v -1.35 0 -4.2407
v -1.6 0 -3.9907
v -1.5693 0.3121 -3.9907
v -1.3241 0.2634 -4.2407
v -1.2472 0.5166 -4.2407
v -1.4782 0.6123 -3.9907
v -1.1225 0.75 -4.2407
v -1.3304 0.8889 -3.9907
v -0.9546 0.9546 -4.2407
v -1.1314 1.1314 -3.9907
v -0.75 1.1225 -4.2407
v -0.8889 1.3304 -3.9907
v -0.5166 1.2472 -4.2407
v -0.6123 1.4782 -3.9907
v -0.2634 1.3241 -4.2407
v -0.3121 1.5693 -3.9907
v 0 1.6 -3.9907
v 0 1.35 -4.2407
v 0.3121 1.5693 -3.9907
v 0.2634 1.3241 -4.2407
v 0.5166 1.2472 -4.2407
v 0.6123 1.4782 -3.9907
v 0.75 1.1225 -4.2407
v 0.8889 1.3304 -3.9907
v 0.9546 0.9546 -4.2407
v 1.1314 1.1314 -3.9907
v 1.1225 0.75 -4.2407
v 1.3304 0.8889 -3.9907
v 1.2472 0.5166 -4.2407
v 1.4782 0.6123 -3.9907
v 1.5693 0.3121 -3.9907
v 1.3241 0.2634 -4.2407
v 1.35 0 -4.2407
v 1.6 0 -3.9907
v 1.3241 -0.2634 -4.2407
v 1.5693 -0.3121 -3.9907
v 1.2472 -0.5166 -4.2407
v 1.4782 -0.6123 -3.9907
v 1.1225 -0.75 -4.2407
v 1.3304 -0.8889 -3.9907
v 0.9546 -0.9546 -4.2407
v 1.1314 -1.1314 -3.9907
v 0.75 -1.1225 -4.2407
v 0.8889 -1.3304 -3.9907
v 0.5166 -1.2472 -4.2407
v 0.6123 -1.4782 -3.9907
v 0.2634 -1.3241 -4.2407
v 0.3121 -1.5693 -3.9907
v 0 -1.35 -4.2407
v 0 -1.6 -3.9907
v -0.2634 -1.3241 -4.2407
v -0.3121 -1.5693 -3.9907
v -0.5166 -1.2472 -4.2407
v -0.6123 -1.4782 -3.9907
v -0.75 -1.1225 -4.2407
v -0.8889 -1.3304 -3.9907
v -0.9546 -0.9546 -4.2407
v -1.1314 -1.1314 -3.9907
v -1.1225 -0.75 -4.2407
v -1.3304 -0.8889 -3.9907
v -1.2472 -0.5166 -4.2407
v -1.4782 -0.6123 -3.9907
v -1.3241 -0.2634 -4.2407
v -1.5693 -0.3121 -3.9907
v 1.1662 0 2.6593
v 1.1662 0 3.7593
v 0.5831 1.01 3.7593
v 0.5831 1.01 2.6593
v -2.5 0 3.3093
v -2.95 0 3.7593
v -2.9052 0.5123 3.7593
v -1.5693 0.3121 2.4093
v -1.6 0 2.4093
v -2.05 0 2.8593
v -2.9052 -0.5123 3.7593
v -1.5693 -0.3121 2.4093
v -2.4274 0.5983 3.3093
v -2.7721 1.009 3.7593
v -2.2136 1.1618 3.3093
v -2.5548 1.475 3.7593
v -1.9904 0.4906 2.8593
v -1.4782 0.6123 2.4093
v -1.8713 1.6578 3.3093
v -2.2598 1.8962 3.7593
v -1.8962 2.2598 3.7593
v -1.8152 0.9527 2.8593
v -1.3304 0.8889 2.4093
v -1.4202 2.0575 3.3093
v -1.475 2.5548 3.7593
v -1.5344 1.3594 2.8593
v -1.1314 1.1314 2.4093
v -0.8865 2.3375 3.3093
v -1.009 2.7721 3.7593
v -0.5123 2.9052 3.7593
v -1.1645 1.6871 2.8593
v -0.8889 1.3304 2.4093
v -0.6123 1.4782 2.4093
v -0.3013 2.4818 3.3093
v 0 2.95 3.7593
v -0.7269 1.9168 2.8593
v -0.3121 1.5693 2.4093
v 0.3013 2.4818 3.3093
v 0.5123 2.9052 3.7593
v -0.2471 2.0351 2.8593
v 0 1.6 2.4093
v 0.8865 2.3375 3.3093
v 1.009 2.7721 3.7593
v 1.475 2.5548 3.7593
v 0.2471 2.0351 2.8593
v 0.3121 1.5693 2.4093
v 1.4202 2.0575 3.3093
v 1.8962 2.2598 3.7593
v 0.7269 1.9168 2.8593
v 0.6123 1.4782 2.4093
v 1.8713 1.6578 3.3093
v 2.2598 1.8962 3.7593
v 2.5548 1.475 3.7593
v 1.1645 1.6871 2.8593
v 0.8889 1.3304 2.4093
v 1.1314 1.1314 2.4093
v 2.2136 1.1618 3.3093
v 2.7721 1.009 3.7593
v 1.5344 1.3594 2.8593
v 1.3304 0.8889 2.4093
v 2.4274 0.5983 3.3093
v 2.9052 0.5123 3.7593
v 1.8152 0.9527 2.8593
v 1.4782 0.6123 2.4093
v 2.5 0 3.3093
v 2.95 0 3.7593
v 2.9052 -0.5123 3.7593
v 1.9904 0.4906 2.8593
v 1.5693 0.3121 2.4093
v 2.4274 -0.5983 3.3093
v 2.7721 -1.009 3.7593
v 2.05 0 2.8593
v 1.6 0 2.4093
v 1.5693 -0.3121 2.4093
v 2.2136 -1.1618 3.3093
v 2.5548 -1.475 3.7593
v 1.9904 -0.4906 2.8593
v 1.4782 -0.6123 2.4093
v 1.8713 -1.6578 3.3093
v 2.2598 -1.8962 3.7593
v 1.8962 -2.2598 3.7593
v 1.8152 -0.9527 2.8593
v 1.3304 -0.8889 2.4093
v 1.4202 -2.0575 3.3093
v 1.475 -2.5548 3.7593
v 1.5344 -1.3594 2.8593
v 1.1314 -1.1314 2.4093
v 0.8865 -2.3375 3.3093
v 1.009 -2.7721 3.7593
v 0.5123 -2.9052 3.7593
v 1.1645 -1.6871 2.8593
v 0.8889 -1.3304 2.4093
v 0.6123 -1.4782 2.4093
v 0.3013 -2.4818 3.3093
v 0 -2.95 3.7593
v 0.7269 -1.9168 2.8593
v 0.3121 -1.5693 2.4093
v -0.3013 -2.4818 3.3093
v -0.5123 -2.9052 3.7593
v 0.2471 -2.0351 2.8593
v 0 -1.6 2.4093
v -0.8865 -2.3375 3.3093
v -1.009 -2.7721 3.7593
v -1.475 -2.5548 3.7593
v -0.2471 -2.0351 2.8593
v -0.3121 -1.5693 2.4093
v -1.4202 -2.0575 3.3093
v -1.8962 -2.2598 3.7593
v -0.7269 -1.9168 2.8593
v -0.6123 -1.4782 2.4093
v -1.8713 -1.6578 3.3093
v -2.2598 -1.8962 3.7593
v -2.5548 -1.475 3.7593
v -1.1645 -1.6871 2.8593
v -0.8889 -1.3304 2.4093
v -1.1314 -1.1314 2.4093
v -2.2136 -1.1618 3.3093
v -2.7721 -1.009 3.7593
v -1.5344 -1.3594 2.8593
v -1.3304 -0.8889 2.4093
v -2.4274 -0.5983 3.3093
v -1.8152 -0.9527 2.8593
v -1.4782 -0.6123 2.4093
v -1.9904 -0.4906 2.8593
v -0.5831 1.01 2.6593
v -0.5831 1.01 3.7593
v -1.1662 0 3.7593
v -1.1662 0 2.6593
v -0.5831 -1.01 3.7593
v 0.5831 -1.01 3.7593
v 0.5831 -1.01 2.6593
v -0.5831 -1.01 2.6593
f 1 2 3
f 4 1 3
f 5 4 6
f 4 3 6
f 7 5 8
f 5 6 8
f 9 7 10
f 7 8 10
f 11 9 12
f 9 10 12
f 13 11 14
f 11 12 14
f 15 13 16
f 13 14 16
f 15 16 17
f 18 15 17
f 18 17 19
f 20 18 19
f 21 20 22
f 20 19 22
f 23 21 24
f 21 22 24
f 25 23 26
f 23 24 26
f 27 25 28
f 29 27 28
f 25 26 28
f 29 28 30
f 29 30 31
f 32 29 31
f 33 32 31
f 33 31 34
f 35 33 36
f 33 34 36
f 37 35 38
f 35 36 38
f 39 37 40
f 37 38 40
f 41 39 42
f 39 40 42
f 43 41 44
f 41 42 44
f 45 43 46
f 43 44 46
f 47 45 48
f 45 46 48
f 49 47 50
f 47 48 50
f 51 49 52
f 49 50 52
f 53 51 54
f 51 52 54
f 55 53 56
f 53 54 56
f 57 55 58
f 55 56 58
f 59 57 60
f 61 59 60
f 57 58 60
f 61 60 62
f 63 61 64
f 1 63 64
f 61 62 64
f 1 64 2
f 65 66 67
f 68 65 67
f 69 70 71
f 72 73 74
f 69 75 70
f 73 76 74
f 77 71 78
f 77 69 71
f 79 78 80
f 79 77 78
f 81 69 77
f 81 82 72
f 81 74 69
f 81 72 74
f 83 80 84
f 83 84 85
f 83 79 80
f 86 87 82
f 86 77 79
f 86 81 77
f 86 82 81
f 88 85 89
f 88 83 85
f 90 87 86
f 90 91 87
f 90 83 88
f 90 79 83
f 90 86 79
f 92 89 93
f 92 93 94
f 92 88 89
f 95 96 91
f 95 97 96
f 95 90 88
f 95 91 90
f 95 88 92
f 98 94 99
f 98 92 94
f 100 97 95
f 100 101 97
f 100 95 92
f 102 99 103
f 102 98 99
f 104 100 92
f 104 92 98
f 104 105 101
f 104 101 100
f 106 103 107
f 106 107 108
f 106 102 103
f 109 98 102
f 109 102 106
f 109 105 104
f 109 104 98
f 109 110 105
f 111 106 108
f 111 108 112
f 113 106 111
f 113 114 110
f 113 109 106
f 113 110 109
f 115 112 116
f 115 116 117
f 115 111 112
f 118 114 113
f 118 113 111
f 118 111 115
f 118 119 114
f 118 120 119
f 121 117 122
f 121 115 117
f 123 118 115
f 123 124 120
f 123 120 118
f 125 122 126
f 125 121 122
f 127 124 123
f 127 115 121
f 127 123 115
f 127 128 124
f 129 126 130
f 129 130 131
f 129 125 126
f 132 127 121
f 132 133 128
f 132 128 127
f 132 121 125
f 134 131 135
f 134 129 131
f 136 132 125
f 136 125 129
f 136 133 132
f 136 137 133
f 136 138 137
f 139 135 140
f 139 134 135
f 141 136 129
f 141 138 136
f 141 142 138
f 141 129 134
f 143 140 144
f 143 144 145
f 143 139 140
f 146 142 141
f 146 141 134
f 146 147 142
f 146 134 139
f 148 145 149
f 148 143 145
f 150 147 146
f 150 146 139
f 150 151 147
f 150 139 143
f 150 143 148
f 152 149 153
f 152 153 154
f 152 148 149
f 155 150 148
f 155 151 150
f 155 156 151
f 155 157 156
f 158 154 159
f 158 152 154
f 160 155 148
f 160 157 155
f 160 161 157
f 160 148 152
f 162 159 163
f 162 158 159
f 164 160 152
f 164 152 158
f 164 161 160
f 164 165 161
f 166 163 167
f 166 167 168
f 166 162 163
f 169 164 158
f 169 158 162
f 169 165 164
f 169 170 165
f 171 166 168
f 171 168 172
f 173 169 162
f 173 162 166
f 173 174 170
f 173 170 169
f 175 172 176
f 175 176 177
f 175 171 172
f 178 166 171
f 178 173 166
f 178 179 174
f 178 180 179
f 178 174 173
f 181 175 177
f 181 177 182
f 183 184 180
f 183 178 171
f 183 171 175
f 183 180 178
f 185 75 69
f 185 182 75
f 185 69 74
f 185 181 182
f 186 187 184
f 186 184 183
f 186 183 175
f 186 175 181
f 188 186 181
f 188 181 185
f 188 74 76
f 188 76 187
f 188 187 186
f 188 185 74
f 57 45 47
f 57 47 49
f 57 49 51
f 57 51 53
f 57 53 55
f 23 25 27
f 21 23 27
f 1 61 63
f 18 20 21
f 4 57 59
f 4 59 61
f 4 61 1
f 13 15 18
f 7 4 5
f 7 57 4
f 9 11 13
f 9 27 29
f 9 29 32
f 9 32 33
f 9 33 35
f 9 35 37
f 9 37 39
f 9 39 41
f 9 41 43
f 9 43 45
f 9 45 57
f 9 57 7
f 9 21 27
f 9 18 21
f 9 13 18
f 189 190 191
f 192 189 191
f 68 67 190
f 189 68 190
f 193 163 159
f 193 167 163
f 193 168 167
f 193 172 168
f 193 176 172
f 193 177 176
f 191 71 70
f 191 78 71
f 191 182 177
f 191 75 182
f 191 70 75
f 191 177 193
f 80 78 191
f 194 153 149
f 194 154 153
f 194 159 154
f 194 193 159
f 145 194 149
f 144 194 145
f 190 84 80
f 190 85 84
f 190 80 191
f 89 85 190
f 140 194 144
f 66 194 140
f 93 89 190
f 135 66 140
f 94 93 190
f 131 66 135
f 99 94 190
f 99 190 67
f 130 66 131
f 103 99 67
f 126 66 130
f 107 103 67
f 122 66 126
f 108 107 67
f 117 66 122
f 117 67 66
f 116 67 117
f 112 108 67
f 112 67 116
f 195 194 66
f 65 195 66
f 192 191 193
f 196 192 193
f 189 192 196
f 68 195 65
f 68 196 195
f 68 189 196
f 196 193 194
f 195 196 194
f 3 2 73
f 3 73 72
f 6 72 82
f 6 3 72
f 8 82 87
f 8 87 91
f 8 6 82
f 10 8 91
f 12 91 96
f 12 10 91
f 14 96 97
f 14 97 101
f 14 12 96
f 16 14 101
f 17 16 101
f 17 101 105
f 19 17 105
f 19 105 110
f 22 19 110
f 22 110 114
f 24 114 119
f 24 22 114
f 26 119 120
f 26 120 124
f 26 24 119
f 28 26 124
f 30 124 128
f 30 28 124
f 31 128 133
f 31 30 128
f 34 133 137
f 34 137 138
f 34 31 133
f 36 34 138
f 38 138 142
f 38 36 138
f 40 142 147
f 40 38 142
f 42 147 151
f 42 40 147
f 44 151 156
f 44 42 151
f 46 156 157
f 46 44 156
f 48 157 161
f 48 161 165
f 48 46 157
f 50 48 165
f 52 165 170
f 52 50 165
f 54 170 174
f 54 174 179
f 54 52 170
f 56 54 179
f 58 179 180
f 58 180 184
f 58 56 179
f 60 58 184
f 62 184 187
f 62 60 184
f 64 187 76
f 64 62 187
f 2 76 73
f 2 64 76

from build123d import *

# Parameters (mm, degrees)
F3_DEPTH = 1.1
F4_SIZE  = 0.25


with BuildPart() as f1:
    # F0 (on Front) → F1 (revolve)
    with BuildSketch(Plane.XZ):
        Polygon((-1.6, -4.240741), (0, -4.240741), (0, 3.759259), (-2.95, 3.759259), (-1.6, 2.409259), align=None)
    revolve(axis=Axis((0, 0, -0.240741), (0, 0, -1)))

    # F2 (on face) → F3 (cut)
    with BuildSketch(Plane.XY.offset(3.759259)):
        Polygon((0.583124, -1.01), (1.166248, 0), (0.583124, 1.01), (-0.583124, 1.01), (-1.166248, 0), (-0.583124, -1.01), align=None)
    extrude(amount=-F3_DEPTH, mode=Mode.SUBTRACT)

    # F4
    f4_edges = [f1.edges().sort_by_distance(p)[0] for p in [
        (1.6, 0, -4.240741),
    ]]
    chamfer(f4_edges, length=F4_SIZE)


solid = f1.part
